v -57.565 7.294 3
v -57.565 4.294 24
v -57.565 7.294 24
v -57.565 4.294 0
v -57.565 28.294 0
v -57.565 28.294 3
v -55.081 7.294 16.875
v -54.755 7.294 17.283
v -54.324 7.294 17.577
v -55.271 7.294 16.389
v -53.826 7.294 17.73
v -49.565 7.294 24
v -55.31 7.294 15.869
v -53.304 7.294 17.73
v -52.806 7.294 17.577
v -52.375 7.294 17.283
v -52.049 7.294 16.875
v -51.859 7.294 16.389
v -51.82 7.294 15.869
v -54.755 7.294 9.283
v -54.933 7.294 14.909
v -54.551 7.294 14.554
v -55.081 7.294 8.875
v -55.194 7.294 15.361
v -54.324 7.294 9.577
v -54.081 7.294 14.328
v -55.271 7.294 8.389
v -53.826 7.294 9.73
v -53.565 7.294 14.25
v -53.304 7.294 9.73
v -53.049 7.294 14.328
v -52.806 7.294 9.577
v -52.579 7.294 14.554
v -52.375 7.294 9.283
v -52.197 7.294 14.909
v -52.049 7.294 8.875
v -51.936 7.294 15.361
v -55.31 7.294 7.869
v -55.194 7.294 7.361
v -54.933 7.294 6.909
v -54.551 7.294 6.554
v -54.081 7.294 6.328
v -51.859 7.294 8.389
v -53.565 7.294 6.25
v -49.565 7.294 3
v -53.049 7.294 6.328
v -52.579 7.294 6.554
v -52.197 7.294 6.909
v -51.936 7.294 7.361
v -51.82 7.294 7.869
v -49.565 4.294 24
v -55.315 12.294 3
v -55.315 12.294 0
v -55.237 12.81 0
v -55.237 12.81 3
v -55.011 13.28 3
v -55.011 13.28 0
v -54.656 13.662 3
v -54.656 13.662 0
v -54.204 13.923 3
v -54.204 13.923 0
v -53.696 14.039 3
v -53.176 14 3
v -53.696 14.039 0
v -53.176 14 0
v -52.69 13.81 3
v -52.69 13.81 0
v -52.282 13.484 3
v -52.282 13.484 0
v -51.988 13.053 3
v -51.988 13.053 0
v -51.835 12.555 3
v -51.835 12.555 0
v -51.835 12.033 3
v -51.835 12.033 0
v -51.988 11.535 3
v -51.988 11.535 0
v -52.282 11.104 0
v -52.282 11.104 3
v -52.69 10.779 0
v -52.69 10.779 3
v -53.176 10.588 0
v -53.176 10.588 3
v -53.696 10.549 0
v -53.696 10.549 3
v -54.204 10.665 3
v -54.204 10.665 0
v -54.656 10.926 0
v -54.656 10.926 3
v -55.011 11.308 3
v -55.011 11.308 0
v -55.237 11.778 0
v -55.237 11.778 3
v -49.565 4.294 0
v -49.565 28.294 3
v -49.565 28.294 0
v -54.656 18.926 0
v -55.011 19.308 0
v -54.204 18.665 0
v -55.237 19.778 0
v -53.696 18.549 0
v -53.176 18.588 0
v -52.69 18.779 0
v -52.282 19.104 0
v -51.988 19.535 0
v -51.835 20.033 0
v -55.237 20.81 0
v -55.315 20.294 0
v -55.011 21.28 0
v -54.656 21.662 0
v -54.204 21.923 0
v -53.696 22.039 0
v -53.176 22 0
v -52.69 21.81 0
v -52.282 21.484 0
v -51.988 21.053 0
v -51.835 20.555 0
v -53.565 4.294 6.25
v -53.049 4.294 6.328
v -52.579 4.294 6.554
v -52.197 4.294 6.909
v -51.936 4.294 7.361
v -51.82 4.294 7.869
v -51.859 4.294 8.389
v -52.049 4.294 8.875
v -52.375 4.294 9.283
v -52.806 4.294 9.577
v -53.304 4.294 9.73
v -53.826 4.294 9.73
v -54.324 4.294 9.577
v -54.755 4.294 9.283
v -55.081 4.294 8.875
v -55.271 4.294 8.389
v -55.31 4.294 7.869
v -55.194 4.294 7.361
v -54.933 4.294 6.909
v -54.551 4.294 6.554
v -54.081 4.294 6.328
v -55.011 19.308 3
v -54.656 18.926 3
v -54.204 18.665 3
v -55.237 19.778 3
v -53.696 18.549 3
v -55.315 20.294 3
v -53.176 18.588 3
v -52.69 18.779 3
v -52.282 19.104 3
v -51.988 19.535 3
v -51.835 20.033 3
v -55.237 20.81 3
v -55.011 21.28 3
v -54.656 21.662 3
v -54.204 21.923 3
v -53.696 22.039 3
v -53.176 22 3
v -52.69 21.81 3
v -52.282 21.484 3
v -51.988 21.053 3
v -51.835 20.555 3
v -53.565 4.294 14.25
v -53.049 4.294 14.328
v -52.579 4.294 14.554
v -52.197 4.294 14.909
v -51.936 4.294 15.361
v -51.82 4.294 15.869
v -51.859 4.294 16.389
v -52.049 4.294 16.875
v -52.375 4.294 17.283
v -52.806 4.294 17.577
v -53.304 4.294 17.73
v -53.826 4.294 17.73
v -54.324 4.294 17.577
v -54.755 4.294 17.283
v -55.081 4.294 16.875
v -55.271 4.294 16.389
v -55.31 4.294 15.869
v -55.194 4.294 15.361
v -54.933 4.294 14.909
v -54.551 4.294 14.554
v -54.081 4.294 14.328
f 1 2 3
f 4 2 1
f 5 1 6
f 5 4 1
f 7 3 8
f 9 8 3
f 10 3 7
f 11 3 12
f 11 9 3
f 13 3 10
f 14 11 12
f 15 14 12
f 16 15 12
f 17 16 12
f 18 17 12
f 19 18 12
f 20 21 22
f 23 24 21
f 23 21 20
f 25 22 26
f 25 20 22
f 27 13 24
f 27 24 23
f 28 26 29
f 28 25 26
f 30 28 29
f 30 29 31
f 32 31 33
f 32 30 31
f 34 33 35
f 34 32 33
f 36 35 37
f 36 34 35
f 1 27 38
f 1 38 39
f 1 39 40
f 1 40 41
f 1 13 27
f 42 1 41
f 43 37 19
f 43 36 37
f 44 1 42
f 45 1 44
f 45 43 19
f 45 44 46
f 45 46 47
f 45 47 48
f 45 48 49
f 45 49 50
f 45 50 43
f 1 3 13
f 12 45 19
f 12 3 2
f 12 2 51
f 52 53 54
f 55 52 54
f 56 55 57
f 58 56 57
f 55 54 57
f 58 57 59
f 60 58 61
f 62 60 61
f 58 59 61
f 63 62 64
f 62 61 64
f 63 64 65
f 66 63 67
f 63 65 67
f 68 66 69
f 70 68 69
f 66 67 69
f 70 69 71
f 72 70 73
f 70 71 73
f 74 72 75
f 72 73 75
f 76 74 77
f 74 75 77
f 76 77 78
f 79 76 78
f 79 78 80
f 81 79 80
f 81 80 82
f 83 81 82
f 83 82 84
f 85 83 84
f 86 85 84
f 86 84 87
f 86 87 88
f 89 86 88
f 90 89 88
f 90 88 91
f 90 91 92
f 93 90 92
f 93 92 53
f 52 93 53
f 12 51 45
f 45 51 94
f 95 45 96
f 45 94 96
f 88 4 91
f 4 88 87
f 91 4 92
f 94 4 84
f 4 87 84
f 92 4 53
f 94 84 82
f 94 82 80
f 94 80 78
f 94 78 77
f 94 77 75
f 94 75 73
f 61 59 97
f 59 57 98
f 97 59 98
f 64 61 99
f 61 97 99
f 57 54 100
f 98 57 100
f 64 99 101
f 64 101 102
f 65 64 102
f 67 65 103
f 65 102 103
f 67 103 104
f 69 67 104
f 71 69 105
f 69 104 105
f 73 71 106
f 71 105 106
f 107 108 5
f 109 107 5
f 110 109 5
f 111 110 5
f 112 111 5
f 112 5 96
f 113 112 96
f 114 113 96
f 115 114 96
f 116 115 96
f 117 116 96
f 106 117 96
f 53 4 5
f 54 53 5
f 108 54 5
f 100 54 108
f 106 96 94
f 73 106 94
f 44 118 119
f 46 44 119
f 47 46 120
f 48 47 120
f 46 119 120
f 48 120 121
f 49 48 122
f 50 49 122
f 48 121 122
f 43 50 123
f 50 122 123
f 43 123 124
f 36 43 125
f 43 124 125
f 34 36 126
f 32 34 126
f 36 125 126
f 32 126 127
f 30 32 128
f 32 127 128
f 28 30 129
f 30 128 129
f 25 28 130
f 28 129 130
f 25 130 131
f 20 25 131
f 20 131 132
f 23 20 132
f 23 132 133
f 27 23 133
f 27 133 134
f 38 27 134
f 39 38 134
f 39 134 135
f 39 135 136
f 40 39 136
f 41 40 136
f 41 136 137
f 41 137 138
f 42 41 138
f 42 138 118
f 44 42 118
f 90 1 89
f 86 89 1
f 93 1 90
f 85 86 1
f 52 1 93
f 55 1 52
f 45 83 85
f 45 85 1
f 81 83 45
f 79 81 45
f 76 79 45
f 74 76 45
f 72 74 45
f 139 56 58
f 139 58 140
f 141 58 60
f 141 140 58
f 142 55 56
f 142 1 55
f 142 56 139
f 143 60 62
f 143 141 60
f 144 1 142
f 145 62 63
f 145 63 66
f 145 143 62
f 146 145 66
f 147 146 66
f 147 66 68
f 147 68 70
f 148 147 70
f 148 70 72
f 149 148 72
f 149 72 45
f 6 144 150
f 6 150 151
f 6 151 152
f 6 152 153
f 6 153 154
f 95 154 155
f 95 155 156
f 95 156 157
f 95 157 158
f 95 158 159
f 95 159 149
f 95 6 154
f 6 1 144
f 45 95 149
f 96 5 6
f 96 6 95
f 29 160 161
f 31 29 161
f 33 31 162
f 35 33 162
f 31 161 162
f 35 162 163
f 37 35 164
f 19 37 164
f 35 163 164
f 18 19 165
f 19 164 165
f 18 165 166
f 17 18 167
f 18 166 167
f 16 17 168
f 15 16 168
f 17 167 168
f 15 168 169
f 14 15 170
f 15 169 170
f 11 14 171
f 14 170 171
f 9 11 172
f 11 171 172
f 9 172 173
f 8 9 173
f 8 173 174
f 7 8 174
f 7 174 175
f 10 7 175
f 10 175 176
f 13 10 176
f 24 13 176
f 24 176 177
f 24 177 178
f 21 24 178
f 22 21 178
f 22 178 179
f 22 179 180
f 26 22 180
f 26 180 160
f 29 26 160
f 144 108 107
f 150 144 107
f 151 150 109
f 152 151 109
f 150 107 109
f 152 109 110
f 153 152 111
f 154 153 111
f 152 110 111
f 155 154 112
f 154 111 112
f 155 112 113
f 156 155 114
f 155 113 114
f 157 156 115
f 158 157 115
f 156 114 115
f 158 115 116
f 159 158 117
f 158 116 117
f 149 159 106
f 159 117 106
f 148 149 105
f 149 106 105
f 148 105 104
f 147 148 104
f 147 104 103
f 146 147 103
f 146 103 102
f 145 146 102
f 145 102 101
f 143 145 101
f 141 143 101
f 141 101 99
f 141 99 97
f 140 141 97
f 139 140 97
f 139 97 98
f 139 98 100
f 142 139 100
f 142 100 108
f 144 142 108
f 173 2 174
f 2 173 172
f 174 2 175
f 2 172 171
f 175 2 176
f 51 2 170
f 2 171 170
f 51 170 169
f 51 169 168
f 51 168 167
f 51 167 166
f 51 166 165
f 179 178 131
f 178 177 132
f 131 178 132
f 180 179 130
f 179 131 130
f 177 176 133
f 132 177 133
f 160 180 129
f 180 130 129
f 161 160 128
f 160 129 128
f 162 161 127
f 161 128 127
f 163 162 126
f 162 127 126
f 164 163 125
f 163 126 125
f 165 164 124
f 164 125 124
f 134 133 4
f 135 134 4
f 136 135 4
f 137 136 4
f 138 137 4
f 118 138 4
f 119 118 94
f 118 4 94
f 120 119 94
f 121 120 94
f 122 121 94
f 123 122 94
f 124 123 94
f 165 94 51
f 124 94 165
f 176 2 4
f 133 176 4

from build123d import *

# Parameters (mm, degrees)
SKETCH2_W           = 8
SKETCH2_H           = 24
BOSS_EXTRUDE1_DEPTH = 3
SKETCH3_W           = 8
SKETCH3_H           = 3
BOSS_EXTRUDE2_DEPTH = 21
SKETCH7_R           = 1.75
CUT_EXTRUDE3_DEPTH  = 10
SKETCH8_R           = 1.75
CUT_EXTRUDE4_DEPTH  = 10


with BuildPart() as part:
    # Sketch2 → Boss-Extrude1 (new body)
    with BuildSketch(Plane.XY):
        with Locations((-53.564966099, 16.294171637)):
            Rectangle(SKETCH2_W, SKETCH2_H)
    extrude(amount=BOSS_EXTRUDE1_DEPTH)

    # Sketch3 → Boss-Extrude2 (add)
    with BuildSketch(Plane.XY.offset(3)):
        with Locations((-53.564966099, 5.794171637)):
            Rectangle(SKETCH3_W, SKETCH3_H)
    extrude(amount=BOSS_EXTRUDE2_DEPTH)

    # Sketch7 → Cut-Extrude3 (cut)
    with BuildSketch(Plane(origin=(0, 0, 0), x_dir=(-1, 0, 0), z_dir=(0, 0, -1))):
        with Locations((53.564966099, 12.294171637)):
            Circle(SKETCH7_R)
        with Locations((53.564966099, 20.294171637)):
            Circle(SKETCH7_R)
    extrude(amount=-CUT_EXTRUDE3_DEPTH, mode=Mode.SUBTRACT)

    # Sketch8 → Cut-Extrude4 (cut)
    with BuildSketch(Plane.XZ.offset(-4.294171637)):
        with Locations(Location((-53.564966099, 8, 0), (0, 0, 270))):
            Circle(SKETCH8_R)
        with Locations(Location((-53.564966099, 16, 0), (0, 0, 270))):
            Circle(SKETCH8_R)
    extrude(amount=-CUT_EXTRUDE4_DEPTH, mode=Mode.SUBTRACT)


solid = part.part
